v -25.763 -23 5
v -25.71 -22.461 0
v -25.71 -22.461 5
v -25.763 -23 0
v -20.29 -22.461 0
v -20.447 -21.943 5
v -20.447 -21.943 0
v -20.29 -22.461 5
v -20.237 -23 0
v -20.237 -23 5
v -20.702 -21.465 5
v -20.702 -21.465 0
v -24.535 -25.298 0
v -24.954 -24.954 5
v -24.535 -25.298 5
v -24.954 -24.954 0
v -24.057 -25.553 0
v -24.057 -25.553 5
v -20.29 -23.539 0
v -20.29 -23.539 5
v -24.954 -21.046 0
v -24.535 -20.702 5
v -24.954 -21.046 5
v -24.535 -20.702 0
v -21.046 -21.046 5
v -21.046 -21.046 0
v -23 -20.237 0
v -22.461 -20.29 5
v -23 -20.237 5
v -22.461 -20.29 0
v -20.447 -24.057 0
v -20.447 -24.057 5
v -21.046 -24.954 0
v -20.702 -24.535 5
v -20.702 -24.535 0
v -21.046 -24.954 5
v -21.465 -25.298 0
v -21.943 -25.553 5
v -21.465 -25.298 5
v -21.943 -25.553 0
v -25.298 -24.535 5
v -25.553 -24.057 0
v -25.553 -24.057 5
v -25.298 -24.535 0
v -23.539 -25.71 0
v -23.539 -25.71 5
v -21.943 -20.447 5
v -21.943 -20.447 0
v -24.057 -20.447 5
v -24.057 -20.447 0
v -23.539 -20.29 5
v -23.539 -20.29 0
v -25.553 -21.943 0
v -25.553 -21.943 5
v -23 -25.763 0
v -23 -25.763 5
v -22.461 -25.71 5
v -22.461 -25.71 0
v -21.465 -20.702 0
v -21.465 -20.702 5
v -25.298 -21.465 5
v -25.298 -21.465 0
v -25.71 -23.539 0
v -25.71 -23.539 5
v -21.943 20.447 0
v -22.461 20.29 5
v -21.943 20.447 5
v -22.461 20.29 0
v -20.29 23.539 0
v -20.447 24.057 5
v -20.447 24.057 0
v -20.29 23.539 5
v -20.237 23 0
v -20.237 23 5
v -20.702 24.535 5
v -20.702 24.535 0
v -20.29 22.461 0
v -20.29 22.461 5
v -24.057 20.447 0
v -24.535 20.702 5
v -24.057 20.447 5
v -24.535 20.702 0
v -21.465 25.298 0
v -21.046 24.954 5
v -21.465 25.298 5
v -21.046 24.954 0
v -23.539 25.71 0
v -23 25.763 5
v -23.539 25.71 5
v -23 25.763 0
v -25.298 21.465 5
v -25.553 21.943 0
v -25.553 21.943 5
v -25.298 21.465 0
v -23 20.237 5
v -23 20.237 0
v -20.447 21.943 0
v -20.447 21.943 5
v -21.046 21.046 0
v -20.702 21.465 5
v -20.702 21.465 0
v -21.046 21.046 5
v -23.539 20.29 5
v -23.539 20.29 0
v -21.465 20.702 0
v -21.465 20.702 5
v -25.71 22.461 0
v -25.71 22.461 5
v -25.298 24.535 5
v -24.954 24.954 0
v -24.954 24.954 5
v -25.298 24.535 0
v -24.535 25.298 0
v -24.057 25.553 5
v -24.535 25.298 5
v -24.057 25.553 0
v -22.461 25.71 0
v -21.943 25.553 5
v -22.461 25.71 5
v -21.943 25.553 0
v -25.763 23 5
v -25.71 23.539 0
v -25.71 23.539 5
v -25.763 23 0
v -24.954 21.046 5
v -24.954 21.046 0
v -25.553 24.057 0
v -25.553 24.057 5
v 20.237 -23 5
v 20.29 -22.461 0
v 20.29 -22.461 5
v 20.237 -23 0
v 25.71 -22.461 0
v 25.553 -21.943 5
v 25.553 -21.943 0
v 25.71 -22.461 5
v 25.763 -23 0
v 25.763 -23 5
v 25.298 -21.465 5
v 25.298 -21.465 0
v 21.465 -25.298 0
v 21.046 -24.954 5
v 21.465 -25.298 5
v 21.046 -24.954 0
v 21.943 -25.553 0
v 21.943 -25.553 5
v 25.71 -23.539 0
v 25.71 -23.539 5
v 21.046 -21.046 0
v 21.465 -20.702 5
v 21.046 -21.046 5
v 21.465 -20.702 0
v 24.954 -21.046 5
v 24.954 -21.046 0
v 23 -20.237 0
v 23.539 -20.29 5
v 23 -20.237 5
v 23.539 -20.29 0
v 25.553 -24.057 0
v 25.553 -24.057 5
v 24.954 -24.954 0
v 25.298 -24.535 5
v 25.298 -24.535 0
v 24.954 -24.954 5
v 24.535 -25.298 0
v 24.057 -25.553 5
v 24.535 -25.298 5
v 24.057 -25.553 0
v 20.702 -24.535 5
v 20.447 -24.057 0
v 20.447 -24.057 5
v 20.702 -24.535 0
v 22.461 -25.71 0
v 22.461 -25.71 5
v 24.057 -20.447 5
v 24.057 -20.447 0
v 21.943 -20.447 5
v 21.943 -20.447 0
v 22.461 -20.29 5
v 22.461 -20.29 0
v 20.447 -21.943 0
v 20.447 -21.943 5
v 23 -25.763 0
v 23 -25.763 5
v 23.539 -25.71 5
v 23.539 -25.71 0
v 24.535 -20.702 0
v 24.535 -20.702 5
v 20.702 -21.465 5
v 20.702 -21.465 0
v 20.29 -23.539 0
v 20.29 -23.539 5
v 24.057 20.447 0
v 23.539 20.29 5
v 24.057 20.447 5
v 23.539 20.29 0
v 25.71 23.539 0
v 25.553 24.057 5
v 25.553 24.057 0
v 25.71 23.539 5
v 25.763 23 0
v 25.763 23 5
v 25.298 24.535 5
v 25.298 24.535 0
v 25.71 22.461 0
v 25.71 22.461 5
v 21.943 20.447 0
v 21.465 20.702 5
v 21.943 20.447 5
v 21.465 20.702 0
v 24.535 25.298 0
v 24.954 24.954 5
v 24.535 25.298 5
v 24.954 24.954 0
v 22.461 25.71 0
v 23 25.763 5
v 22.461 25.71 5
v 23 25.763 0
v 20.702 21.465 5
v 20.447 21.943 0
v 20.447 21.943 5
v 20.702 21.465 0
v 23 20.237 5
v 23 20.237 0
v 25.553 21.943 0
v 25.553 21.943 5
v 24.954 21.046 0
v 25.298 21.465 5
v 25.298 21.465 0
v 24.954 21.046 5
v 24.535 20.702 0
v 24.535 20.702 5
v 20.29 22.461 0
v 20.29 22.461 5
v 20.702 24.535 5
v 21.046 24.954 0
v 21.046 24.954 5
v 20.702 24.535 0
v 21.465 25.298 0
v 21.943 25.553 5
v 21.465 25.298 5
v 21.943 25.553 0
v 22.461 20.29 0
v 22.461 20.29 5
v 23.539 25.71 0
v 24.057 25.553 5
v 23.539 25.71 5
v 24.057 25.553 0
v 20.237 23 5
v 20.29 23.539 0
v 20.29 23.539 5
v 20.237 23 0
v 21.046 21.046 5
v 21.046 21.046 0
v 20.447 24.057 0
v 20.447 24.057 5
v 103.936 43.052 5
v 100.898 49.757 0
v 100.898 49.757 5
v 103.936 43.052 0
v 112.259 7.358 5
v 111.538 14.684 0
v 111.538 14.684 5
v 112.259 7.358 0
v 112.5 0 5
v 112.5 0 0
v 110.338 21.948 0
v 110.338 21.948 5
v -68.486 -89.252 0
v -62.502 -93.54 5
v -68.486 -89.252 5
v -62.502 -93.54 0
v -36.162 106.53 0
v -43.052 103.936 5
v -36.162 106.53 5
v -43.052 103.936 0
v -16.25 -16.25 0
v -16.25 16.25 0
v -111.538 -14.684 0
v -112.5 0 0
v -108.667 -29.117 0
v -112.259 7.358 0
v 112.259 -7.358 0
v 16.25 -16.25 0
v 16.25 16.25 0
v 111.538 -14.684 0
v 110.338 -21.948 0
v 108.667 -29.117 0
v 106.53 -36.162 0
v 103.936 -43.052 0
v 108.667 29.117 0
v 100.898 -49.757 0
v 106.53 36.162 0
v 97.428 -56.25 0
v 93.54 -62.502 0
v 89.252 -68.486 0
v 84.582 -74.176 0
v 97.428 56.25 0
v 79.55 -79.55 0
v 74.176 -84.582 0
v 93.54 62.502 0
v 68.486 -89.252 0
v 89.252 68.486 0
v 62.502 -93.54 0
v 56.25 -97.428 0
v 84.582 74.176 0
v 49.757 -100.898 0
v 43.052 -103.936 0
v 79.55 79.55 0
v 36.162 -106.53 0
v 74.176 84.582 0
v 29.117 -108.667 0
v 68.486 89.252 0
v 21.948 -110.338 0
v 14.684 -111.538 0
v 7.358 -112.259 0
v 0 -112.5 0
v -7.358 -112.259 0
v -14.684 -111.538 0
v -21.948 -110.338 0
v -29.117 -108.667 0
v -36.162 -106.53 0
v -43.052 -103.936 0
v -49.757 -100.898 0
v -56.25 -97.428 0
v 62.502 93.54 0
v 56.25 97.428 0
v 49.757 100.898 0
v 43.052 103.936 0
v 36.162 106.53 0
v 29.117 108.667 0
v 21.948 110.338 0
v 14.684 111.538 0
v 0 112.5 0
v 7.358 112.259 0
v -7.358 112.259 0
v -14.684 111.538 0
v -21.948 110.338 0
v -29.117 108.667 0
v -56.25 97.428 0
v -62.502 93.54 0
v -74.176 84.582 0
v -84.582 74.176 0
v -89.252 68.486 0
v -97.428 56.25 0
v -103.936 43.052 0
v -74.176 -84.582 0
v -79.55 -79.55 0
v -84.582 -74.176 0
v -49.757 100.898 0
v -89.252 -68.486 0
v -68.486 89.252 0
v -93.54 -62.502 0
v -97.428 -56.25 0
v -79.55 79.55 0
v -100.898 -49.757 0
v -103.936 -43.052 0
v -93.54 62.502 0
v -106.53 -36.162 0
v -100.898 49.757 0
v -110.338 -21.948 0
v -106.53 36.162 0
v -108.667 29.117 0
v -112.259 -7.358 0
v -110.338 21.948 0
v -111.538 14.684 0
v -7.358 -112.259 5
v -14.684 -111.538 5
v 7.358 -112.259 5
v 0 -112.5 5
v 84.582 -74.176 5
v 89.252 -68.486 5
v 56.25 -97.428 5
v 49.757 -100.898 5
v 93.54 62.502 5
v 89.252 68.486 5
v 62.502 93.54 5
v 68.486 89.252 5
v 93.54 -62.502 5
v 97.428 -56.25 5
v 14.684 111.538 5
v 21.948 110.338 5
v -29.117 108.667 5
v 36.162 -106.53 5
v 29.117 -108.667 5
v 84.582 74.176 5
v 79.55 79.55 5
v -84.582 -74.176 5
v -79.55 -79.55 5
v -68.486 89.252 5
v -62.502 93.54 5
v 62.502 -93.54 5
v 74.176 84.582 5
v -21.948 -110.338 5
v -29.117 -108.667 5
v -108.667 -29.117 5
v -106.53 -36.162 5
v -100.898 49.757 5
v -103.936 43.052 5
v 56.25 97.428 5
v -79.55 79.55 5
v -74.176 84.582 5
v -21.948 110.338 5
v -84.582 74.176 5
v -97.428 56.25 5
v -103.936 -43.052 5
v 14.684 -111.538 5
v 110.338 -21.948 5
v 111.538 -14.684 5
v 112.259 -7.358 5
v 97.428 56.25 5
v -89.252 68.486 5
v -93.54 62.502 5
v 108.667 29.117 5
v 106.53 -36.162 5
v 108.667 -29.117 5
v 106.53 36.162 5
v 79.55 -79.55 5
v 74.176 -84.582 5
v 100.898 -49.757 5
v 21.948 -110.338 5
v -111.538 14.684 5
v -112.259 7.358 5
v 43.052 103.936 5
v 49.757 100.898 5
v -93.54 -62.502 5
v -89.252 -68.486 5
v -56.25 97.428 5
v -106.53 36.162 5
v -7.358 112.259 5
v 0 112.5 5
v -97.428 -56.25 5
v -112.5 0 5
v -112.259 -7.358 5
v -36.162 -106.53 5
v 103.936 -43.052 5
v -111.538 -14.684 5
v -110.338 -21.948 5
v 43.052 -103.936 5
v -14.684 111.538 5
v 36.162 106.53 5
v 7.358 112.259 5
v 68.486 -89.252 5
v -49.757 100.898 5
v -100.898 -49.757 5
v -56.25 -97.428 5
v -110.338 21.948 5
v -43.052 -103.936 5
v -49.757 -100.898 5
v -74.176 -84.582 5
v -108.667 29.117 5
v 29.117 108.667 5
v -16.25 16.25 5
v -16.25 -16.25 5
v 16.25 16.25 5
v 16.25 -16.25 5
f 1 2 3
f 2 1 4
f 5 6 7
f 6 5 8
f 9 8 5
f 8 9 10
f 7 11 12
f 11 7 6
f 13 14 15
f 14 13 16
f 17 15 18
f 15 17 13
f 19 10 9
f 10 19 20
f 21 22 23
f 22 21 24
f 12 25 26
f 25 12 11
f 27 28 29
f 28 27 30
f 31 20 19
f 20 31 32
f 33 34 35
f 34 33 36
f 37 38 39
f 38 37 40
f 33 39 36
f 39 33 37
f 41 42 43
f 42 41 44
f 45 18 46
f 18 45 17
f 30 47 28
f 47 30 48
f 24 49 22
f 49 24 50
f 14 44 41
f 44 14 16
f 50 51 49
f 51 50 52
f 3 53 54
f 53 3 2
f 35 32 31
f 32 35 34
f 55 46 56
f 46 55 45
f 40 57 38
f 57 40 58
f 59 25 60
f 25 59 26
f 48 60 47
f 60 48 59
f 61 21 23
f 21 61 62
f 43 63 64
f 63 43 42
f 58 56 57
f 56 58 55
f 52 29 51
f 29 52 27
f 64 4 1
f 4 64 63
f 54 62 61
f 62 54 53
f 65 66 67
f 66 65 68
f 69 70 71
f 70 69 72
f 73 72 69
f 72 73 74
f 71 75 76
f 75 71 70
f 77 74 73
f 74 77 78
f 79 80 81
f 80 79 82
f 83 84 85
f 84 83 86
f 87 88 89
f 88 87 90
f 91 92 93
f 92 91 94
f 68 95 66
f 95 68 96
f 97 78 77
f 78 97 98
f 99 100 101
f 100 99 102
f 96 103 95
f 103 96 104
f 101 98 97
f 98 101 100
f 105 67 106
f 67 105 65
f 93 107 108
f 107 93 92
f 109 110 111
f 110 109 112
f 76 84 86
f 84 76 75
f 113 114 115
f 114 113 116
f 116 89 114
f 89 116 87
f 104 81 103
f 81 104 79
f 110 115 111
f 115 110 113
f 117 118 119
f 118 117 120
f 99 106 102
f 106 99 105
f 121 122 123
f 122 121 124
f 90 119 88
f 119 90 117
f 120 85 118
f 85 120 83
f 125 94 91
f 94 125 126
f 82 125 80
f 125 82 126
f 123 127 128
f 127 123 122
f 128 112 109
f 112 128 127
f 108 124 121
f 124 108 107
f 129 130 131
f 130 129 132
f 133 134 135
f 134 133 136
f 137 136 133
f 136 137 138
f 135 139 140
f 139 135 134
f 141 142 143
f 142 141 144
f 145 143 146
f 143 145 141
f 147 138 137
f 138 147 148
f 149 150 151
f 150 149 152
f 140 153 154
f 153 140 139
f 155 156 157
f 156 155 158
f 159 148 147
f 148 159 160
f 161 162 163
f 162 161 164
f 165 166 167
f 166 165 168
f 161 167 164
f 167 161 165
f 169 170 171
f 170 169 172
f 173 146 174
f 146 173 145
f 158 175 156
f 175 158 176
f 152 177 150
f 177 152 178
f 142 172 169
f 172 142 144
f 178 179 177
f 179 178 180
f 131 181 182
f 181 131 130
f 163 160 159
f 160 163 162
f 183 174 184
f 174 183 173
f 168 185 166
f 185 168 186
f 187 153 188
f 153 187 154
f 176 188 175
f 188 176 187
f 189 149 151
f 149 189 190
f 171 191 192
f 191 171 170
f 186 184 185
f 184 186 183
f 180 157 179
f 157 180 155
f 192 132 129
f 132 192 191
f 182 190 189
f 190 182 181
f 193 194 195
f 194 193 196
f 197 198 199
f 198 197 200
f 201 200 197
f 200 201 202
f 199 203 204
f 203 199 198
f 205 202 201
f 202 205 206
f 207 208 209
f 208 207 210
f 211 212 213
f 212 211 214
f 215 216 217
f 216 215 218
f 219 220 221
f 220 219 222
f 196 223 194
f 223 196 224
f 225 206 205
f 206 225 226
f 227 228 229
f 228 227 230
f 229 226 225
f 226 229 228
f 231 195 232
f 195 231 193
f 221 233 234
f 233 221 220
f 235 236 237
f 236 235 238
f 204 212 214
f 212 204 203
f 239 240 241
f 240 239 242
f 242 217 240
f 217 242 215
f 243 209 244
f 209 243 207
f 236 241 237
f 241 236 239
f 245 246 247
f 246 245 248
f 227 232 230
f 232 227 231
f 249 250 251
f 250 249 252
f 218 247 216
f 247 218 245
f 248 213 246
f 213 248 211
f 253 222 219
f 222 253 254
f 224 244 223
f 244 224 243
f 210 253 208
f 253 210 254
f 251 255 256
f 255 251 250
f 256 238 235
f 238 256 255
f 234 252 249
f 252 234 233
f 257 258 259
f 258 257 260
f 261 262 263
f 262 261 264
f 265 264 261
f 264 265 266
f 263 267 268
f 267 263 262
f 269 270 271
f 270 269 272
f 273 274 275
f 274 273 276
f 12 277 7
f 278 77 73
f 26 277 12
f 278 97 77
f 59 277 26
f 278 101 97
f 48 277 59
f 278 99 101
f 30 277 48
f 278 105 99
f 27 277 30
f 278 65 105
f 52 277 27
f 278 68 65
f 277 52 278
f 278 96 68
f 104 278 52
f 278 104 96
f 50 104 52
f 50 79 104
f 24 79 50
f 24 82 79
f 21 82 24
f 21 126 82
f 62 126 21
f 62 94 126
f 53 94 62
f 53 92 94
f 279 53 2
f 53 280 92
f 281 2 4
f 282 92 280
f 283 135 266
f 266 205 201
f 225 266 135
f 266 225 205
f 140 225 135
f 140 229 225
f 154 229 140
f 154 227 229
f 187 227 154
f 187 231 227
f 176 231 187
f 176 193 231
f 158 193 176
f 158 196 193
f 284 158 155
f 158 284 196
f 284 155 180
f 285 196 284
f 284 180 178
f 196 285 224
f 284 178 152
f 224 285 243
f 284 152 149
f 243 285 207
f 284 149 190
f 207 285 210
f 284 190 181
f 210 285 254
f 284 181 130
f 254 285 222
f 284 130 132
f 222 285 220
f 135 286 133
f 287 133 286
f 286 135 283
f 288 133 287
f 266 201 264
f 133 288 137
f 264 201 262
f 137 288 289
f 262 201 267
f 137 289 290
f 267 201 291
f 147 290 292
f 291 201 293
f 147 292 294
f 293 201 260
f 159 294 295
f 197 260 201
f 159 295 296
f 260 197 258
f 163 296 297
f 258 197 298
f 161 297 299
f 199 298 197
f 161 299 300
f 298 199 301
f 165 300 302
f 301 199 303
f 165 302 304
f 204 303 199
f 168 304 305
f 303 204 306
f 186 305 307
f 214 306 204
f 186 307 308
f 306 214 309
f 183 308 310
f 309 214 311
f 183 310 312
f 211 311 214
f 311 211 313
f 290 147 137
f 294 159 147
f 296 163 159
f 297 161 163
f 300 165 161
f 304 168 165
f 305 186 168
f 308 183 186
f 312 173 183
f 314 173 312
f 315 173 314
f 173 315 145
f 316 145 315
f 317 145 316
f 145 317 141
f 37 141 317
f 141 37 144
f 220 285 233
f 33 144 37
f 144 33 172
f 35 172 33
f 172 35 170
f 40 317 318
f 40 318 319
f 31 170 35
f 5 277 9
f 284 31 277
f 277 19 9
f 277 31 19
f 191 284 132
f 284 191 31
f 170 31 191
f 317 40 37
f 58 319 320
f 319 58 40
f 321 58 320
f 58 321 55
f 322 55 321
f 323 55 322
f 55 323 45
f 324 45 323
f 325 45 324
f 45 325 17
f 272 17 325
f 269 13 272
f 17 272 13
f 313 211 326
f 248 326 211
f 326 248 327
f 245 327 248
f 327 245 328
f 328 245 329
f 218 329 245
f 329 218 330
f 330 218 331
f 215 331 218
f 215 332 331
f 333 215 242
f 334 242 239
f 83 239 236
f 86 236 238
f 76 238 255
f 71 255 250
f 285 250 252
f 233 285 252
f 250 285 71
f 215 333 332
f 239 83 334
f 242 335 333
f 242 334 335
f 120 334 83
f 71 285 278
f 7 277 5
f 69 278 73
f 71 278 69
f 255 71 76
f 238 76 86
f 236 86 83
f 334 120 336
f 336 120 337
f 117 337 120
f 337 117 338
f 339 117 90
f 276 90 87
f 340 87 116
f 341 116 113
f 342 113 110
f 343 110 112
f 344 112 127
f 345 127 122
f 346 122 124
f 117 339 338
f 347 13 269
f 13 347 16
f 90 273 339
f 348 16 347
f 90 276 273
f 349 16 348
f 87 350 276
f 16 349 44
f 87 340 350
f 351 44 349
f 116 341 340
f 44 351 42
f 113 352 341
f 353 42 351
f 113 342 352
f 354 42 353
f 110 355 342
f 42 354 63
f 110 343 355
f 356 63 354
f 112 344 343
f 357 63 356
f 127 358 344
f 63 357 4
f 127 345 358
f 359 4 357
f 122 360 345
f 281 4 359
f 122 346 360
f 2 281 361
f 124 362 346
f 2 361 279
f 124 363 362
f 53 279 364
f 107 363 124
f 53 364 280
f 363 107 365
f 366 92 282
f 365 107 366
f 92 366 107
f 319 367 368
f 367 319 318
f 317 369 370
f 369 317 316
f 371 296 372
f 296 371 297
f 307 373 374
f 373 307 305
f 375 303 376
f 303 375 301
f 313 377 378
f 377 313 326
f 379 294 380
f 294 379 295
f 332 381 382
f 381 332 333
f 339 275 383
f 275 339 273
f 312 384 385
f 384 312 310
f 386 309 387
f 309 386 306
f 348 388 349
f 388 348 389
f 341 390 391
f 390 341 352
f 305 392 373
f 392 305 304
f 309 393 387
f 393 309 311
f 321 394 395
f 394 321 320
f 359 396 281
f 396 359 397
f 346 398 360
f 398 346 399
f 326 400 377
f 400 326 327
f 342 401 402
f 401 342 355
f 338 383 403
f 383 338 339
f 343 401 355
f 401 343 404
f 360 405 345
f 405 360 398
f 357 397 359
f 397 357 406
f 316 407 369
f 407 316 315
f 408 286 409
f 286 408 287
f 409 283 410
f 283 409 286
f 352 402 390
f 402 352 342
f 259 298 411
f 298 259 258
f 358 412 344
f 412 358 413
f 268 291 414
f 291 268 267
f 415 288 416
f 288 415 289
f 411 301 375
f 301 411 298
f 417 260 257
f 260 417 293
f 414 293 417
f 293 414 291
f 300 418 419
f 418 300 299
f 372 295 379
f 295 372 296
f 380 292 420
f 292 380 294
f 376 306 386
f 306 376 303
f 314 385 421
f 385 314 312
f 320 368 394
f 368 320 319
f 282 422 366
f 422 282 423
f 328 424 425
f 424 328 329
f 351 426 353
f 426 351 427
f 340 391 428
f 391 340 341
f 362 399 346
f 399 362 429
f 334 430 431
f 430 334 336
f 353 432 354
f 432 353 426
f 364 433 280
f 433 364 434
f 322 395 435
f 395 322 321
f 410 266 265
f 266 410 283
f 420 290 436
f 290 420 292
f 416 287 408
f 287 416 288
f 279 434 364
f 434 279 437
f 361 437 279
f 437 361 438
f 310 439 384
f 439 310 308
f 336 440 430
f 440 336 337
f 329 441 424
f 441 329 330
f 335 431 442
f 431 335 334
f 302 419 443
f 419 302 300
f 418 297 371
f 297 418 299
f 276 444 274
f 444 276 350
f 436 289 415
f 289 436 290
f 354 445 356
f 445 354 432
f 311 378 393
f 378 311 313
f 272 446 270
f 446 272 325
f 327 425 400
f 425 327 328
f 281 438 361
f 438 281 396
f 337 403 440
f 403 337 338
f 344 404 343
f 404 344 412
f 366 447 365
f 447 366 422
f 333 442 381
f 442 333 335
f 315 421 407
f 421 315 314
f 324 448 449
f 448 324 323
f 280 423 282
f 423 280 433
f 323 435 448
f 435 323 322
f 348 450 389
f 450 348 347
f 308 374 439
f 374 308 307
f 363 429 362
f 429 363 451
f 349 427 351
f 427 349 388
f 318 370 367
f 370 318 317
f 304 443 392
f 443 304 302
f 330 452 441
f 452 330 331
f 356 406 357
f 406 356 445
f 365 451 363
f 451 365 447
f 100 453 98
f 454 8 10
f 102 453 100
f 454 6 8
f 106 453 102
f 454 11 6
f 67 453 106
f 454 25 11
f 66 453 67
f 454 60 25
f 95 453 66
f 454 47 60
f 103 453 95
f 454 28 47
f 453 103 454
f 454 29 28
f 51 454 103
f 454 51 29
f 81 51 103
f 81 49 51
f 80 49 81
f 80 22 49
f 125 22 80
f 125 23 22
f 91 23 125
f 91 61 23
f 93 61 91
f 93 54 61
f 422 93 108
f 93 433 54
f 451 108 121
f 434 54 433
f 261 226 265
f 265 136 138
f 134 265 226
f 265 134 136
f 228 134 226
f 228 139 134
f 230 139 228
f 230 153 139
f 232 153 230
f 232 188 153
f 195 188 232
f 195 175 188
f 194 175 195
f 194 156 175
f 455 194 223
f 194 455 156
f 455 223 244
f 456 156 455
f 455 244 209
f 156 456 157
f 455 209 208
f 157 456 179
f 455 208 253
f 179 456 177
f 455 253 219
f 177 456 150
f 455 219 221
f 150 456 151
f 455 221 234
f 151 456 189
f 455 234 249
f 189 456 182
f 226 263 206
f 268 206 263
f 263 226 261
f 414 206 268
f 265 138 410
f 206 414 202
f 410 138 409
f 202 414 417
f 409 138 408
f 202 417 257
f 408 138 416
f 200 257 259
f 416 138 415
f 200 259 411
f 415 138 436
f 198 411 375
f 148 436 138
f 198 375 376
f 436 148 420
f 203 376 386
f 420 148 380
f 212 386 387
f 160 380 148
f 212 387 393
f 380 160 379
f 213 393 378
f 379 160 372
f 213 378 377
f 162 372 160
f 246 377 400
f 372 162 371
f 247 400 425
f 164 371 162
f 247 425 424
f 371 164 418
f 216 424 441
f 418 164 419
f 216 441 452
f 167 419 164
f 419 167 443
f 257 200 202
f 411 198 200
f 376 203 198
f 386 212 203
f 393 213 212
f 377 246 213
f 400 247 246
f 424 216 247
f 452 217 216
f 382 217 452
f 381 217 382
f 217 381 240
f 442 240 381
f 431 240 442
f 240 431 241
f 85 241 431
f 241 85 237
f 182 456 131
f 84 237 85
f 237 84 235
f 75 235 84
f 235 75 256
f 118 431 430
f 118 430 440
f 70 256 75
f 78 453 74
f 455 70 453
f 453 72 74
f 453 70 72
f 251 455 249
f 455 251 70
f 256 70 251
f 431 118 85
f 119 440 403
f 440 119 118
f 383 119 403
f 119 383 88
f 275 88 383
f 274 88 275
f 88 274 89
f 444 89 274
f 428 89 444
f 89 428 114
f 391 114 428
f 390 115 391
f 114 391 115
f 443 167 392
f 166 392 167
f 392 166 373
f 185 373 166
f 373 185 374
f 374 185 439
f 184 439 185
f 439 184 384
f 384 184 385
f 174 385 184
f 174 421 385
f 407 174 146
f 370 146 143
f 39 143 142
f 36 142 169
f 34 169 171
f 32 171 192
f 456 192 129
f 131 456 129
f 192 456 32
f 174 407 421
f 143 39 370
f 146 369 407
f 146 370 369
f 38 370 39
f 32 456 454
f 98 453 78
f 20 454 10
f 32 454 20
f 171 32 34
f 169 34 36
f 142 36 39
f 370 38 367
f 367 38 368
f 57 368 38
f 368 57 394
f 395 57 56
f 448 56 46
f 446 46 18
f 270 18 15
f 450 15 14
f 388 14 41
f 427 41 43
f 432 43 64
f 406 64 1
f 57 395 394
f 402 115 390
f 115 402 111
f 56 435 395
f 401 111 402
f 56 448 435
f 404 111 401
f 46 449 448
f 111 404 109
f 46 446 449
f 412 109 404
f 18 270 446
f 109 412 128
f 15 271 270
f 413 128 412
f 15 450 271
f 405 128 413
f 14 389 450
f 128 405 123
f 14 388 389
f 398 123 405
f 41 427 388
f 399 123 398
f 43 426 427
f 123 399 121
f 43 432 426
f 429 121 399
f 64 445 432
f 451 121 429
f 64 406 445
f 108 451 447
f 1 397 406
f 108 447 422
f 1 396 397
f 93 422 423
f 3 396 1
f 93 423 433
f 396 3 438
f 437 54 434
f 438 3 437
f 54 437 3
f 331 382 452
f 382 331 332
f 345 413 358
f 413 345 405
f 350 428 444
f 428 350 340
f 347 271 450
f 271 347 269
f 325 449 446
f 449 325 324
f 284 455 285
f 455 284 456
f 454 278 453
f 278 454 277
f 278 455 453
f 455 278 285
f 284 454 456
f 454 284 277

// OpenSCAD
// file: ../../../../../scad/lib/parent_spar_bolted.scad
// Parent modular exterior v2. mm. Geometry shared by individual part wrappers.
// Metal fasteners, ballast, Takachi box and electronics are purchased items.
/* [Dimensions] */
disk_d=225; disk_t=5;
fin_h=125; fin_w=65; fin_t=4;
beam_w=32; clearance=0.5;
float_r=100; flange_r=112.5; float_bore_r=30;
float_wall=4; float_h=180; lid_t=6;
rod_r=105.5; flange_t=6;
hub_h=32; root_x=30; root_depth=14;
$fn=96; e=0.03;
assert(disk_d<=225 && 2*flange_r<=225);
assert(fin_h>=100 && fin_h<=150 && fin_w>=50 && fin_w<=80);
assert(root_x+fin_w<disk_d/2-5);
module bore(d,h) { cylinder(d=d/cos(180/32),h=h,$fn=32); }
module bore_x(d,l) { rotate([0,90,0]) bore(d,l); }
module bore_y(d,l) { rotate([-90,0,0]) bore(d,l); }
module square_bore(h) { translate([-(beam_w+clearance)/2,-(beam_w+clearance)/2,-e]) cube([beam_w+clearance,beam_w+clearance,h+2*e]); }
module rods(h,d=6.5) { for(a=[45:90:315]) rotate([0,0,a]) translate([rod_r,0,-e]) bore(d,h+2*e); }
module lid_bolts(h) { for(a=[22.5:45:359]) rotate([0,0,a]) translate([rod_r,0,-e]) bore(4.5,h+2*e); }
module hub_pin(z) { translate([-46,10,z]) bore_x(6.5,92); }
module disk() {
 difference() { cylinder(d=disk_d,h=disk_t); square_bore(disk_t);
  for(x=[-23,23],y=[-23,23]) translate([x,y,-e]) bore(5.5,disk_t+2*e);
 }
}
module fin() {
 difference() { cube([fin_w,fin_t,fin_h]);
  for(z=[10,fin_h-hub_h+10]) translate([root_depth/2,-e,z]) bore_y(5.5,fin_t+2*e);
 }
}
module hub() {
 difference() {
  union() { translate([-30,-30,0]) cube([60,60,hub_h]);
   for(a=[0:90:270]) rotate([0,0,a]) translate([28,-16,0]) cube([16,32,hub_h]);
  }
  square_bore(hub_h);
  for(a=[0:90:270]) rotate([0,0,a]) {
   translate([root_x-clearance/2,-(fin_t+clearance)/2,-e]) cube([root_depth+clearance,fin_t+clearance,hub_h+2*e]);
   translate([root_x+root_depth/2,-17,10]) bore_y(5.5,34);
  }
  for(x=[-23,23],y=[-23,23]) translate([x,y,-e]) bore(5.5,hub_h+2*e);
  hub_pin(24);
 }
}
module beam(lower=true) {
 len=lower?180:107;
 difference() { translate([-beam_w/2,-beam_w/2,0]) cube([beam_w,beam_w,len]);
  if(lower) { for(z=[24,117]) hub_pin(z); translate([-20,0,160]) bore_x(6.5,40); translate([0,0,-e]) bore(16,8); }
  else for(z=[20,87]) translate([-20,0,z]) bore_x(6.5,40);
 }
}
module coupler() {
 // One half of a screwed split coupler. Mirror Y for the second half.
 difference() { translate([-27,0.25,0]) cube([54,26.75,64]); square_bore(64);
  for(z=[12,52]) translate([-28,0,z]) bore_x(6.5,56);
  for(x=[-22,22],z=[24,40]) translate([x,-1,z]) bore_y(5.5,29);
 }
}
module float_body() {
 difference() {
  union() { cylinder(r=float_r,h=float_h);
   translate([0,0,float_h-flange_t]) cylinder(r=flange_r,h=flange_t);
   // 45-degree underside of the flange instead of a 15 mm unsupported ledge.
   translate([0,0,float_h-flange_t-(flange_r-float_r)]) cylinder(r1=float_r,r2=flange_r,h=flange_r-float_r);
  }
  translate([0,0,-e]) cylinder(r=float_bore_r,h=float_h+2*e);
  translate([0,0,float_wall]) difference() {
   cylinder(r=float_r-float_wall,h=float_h);
   cylinder(r=float_bore_r+float_wall,h=float_h+e);
  }
  // Coupling-nut clearance; nearest cavity wall remains >=3 mm thick.
  rods(float_h,13); lid_bolts(float_h);
  for(a=[22.5:45:359]) rotate([0,0,a]) translate([rod_r,0,-e]) bore(10,float_h-flange_t+e);
 }
}
module float_lid() {
 difference() {
  cylinder(r=flange_r,h=lid_t);
  translate([0,0,-e]) cylinder(r=float_bore_r,h=lid_t+2*e);
  rods(lid_t,13); lid_bolts(lid_t);
  // Continuous face seals: 2 mm cord, 2.4 wide x 1.5 deep grooves.
  for(r=[float_bore_r+float_wall/2,float_r-float_wall/2]) translate([0,0,-e]) difference() {
   cylinder(r=r+1.2,h=1.5+e); cylinder(r=r-1.2,h=1.5+2*e);
  }
 }
}
module float_end(top=true) {
 difference() {
  union() { cylinder(r=flange_r,h=8);
   if(top) translate([-30,-30,8-e]) cube([60,60,20+e]);
   else translate([-23,-23,-40]) cube([46,46,40+e]);
  }
  rods(8);
  if(top) for(x=[-20,20],y=[-20,20]) {
   translate([x,y,-e]) bore(5.5,29);
   translate([x,y,-e]) bore(11,18+e);
  }
  if(top) for(a=[22.5:45:359]) rotate([0,0,a]) translate([rod_r,0,-e]) bore(12,8+2*e);
  else { translate([0,0,-40]) square_bore(40-e);
   translate([-24,0,-20]) bore_x(6.5,48);
  }
 }
}
module ballast_body() {
 // Open upward in print orientation. In the assembly this cup is inverted.
 difference() {
  union() { cylinder(r=45,h=51); translate([0,0,45]) cylinder(r=60,h=6);
   translate([0,0,30]) cylinder(r1=45,r2=60,h=15);
  }
  translate([0,0,6]) cylinder(r=40,h=46);
  for(x=[-23,23],y=[-23,23]) translate([x,y,-e]) bore(5.5,7);
  translate([0,0,-e]) bore(8.5,7);
  for(a=[0:90:270]) rotate([0,0,a]) translate([52,0,29]) { bore(5.5,23); bore(12,16); }
 }
}
module ballast_lid() {
 difference() { cylinder(r=60,h=6);
  for(a=[0:90:270]) rotate([0,0,a]) translate([52,0,-e]) bore(5.5,7);
  // Flooded ballast compartment: drainage, no trapped air assumption.
  for(x=[-20,0,20]) translate([x,0,-e]) bore(6,7);
 }
}
module camera_bridge() {
 // Assembly frame: local top z=78; camera seat z=8. +Y faces camera front.
 difference() {
  union() {
   translate([-30,45,70]) cube([60,90,8]);
   translate([-70,125,0]) cube([140,100,8]);
   translate([-70,125,0]) cube([140,10,78]);
   for(x=[-64,56]) translate([x,0,0]) rotate([90,0,90]) linear_extrude(8)
    polygon([[135,8],[215,8],[135,70]]);
  }
  for(x=[-20,20],y=[50,90]) translate([x,y,69]) bore(5.5,10);
  for(x=[-11,11],y=[174,206]) translate([x,y,-e]) bore(5.5,10);
 }
}
module gps_bridge() {
 // Local attachment face X=0 at deck +X; top shelf z=175.
 difference() {
  union() { translate([0,-25,0]) cube([10,50,183]);
   translate([-90,-48,175]) cube([100,96,8]);
   for(y=[-17,25]) translate([0,y,0]) rotate([90,0,0]) linear_extrude(8)
    polygon([[e,155],[e,175+e],[-80,175+e]]);
  }
  for(y=[-20,20],z=[5,45]) translate([-e,y,z]) bore_x(5.5,11);
  for(y=[-34,34]) translate([-43,y,174]) bore(4.5,10);
 }
}
// Reference antenna envelope, correct mounting ears, not a printable antenna.
module gps_reference() {
 difference() {
  union() { translate([-30,-28,0]) cube([60,56,22.5]);
   translate([-10,-41,0]) cube([20,82,6]); }
  for(y=[-34,34]) translate([0,y,-e]) bore(4.5,7);
 }
}
// main file
// mm. part=print is the intended X1C orientation.
part="assembly"; // [assembly,print]
use <../../../../../scad/lib/parent_spar_bolted.scad>
if(part=="print") { disk(); } else { disk(); }
